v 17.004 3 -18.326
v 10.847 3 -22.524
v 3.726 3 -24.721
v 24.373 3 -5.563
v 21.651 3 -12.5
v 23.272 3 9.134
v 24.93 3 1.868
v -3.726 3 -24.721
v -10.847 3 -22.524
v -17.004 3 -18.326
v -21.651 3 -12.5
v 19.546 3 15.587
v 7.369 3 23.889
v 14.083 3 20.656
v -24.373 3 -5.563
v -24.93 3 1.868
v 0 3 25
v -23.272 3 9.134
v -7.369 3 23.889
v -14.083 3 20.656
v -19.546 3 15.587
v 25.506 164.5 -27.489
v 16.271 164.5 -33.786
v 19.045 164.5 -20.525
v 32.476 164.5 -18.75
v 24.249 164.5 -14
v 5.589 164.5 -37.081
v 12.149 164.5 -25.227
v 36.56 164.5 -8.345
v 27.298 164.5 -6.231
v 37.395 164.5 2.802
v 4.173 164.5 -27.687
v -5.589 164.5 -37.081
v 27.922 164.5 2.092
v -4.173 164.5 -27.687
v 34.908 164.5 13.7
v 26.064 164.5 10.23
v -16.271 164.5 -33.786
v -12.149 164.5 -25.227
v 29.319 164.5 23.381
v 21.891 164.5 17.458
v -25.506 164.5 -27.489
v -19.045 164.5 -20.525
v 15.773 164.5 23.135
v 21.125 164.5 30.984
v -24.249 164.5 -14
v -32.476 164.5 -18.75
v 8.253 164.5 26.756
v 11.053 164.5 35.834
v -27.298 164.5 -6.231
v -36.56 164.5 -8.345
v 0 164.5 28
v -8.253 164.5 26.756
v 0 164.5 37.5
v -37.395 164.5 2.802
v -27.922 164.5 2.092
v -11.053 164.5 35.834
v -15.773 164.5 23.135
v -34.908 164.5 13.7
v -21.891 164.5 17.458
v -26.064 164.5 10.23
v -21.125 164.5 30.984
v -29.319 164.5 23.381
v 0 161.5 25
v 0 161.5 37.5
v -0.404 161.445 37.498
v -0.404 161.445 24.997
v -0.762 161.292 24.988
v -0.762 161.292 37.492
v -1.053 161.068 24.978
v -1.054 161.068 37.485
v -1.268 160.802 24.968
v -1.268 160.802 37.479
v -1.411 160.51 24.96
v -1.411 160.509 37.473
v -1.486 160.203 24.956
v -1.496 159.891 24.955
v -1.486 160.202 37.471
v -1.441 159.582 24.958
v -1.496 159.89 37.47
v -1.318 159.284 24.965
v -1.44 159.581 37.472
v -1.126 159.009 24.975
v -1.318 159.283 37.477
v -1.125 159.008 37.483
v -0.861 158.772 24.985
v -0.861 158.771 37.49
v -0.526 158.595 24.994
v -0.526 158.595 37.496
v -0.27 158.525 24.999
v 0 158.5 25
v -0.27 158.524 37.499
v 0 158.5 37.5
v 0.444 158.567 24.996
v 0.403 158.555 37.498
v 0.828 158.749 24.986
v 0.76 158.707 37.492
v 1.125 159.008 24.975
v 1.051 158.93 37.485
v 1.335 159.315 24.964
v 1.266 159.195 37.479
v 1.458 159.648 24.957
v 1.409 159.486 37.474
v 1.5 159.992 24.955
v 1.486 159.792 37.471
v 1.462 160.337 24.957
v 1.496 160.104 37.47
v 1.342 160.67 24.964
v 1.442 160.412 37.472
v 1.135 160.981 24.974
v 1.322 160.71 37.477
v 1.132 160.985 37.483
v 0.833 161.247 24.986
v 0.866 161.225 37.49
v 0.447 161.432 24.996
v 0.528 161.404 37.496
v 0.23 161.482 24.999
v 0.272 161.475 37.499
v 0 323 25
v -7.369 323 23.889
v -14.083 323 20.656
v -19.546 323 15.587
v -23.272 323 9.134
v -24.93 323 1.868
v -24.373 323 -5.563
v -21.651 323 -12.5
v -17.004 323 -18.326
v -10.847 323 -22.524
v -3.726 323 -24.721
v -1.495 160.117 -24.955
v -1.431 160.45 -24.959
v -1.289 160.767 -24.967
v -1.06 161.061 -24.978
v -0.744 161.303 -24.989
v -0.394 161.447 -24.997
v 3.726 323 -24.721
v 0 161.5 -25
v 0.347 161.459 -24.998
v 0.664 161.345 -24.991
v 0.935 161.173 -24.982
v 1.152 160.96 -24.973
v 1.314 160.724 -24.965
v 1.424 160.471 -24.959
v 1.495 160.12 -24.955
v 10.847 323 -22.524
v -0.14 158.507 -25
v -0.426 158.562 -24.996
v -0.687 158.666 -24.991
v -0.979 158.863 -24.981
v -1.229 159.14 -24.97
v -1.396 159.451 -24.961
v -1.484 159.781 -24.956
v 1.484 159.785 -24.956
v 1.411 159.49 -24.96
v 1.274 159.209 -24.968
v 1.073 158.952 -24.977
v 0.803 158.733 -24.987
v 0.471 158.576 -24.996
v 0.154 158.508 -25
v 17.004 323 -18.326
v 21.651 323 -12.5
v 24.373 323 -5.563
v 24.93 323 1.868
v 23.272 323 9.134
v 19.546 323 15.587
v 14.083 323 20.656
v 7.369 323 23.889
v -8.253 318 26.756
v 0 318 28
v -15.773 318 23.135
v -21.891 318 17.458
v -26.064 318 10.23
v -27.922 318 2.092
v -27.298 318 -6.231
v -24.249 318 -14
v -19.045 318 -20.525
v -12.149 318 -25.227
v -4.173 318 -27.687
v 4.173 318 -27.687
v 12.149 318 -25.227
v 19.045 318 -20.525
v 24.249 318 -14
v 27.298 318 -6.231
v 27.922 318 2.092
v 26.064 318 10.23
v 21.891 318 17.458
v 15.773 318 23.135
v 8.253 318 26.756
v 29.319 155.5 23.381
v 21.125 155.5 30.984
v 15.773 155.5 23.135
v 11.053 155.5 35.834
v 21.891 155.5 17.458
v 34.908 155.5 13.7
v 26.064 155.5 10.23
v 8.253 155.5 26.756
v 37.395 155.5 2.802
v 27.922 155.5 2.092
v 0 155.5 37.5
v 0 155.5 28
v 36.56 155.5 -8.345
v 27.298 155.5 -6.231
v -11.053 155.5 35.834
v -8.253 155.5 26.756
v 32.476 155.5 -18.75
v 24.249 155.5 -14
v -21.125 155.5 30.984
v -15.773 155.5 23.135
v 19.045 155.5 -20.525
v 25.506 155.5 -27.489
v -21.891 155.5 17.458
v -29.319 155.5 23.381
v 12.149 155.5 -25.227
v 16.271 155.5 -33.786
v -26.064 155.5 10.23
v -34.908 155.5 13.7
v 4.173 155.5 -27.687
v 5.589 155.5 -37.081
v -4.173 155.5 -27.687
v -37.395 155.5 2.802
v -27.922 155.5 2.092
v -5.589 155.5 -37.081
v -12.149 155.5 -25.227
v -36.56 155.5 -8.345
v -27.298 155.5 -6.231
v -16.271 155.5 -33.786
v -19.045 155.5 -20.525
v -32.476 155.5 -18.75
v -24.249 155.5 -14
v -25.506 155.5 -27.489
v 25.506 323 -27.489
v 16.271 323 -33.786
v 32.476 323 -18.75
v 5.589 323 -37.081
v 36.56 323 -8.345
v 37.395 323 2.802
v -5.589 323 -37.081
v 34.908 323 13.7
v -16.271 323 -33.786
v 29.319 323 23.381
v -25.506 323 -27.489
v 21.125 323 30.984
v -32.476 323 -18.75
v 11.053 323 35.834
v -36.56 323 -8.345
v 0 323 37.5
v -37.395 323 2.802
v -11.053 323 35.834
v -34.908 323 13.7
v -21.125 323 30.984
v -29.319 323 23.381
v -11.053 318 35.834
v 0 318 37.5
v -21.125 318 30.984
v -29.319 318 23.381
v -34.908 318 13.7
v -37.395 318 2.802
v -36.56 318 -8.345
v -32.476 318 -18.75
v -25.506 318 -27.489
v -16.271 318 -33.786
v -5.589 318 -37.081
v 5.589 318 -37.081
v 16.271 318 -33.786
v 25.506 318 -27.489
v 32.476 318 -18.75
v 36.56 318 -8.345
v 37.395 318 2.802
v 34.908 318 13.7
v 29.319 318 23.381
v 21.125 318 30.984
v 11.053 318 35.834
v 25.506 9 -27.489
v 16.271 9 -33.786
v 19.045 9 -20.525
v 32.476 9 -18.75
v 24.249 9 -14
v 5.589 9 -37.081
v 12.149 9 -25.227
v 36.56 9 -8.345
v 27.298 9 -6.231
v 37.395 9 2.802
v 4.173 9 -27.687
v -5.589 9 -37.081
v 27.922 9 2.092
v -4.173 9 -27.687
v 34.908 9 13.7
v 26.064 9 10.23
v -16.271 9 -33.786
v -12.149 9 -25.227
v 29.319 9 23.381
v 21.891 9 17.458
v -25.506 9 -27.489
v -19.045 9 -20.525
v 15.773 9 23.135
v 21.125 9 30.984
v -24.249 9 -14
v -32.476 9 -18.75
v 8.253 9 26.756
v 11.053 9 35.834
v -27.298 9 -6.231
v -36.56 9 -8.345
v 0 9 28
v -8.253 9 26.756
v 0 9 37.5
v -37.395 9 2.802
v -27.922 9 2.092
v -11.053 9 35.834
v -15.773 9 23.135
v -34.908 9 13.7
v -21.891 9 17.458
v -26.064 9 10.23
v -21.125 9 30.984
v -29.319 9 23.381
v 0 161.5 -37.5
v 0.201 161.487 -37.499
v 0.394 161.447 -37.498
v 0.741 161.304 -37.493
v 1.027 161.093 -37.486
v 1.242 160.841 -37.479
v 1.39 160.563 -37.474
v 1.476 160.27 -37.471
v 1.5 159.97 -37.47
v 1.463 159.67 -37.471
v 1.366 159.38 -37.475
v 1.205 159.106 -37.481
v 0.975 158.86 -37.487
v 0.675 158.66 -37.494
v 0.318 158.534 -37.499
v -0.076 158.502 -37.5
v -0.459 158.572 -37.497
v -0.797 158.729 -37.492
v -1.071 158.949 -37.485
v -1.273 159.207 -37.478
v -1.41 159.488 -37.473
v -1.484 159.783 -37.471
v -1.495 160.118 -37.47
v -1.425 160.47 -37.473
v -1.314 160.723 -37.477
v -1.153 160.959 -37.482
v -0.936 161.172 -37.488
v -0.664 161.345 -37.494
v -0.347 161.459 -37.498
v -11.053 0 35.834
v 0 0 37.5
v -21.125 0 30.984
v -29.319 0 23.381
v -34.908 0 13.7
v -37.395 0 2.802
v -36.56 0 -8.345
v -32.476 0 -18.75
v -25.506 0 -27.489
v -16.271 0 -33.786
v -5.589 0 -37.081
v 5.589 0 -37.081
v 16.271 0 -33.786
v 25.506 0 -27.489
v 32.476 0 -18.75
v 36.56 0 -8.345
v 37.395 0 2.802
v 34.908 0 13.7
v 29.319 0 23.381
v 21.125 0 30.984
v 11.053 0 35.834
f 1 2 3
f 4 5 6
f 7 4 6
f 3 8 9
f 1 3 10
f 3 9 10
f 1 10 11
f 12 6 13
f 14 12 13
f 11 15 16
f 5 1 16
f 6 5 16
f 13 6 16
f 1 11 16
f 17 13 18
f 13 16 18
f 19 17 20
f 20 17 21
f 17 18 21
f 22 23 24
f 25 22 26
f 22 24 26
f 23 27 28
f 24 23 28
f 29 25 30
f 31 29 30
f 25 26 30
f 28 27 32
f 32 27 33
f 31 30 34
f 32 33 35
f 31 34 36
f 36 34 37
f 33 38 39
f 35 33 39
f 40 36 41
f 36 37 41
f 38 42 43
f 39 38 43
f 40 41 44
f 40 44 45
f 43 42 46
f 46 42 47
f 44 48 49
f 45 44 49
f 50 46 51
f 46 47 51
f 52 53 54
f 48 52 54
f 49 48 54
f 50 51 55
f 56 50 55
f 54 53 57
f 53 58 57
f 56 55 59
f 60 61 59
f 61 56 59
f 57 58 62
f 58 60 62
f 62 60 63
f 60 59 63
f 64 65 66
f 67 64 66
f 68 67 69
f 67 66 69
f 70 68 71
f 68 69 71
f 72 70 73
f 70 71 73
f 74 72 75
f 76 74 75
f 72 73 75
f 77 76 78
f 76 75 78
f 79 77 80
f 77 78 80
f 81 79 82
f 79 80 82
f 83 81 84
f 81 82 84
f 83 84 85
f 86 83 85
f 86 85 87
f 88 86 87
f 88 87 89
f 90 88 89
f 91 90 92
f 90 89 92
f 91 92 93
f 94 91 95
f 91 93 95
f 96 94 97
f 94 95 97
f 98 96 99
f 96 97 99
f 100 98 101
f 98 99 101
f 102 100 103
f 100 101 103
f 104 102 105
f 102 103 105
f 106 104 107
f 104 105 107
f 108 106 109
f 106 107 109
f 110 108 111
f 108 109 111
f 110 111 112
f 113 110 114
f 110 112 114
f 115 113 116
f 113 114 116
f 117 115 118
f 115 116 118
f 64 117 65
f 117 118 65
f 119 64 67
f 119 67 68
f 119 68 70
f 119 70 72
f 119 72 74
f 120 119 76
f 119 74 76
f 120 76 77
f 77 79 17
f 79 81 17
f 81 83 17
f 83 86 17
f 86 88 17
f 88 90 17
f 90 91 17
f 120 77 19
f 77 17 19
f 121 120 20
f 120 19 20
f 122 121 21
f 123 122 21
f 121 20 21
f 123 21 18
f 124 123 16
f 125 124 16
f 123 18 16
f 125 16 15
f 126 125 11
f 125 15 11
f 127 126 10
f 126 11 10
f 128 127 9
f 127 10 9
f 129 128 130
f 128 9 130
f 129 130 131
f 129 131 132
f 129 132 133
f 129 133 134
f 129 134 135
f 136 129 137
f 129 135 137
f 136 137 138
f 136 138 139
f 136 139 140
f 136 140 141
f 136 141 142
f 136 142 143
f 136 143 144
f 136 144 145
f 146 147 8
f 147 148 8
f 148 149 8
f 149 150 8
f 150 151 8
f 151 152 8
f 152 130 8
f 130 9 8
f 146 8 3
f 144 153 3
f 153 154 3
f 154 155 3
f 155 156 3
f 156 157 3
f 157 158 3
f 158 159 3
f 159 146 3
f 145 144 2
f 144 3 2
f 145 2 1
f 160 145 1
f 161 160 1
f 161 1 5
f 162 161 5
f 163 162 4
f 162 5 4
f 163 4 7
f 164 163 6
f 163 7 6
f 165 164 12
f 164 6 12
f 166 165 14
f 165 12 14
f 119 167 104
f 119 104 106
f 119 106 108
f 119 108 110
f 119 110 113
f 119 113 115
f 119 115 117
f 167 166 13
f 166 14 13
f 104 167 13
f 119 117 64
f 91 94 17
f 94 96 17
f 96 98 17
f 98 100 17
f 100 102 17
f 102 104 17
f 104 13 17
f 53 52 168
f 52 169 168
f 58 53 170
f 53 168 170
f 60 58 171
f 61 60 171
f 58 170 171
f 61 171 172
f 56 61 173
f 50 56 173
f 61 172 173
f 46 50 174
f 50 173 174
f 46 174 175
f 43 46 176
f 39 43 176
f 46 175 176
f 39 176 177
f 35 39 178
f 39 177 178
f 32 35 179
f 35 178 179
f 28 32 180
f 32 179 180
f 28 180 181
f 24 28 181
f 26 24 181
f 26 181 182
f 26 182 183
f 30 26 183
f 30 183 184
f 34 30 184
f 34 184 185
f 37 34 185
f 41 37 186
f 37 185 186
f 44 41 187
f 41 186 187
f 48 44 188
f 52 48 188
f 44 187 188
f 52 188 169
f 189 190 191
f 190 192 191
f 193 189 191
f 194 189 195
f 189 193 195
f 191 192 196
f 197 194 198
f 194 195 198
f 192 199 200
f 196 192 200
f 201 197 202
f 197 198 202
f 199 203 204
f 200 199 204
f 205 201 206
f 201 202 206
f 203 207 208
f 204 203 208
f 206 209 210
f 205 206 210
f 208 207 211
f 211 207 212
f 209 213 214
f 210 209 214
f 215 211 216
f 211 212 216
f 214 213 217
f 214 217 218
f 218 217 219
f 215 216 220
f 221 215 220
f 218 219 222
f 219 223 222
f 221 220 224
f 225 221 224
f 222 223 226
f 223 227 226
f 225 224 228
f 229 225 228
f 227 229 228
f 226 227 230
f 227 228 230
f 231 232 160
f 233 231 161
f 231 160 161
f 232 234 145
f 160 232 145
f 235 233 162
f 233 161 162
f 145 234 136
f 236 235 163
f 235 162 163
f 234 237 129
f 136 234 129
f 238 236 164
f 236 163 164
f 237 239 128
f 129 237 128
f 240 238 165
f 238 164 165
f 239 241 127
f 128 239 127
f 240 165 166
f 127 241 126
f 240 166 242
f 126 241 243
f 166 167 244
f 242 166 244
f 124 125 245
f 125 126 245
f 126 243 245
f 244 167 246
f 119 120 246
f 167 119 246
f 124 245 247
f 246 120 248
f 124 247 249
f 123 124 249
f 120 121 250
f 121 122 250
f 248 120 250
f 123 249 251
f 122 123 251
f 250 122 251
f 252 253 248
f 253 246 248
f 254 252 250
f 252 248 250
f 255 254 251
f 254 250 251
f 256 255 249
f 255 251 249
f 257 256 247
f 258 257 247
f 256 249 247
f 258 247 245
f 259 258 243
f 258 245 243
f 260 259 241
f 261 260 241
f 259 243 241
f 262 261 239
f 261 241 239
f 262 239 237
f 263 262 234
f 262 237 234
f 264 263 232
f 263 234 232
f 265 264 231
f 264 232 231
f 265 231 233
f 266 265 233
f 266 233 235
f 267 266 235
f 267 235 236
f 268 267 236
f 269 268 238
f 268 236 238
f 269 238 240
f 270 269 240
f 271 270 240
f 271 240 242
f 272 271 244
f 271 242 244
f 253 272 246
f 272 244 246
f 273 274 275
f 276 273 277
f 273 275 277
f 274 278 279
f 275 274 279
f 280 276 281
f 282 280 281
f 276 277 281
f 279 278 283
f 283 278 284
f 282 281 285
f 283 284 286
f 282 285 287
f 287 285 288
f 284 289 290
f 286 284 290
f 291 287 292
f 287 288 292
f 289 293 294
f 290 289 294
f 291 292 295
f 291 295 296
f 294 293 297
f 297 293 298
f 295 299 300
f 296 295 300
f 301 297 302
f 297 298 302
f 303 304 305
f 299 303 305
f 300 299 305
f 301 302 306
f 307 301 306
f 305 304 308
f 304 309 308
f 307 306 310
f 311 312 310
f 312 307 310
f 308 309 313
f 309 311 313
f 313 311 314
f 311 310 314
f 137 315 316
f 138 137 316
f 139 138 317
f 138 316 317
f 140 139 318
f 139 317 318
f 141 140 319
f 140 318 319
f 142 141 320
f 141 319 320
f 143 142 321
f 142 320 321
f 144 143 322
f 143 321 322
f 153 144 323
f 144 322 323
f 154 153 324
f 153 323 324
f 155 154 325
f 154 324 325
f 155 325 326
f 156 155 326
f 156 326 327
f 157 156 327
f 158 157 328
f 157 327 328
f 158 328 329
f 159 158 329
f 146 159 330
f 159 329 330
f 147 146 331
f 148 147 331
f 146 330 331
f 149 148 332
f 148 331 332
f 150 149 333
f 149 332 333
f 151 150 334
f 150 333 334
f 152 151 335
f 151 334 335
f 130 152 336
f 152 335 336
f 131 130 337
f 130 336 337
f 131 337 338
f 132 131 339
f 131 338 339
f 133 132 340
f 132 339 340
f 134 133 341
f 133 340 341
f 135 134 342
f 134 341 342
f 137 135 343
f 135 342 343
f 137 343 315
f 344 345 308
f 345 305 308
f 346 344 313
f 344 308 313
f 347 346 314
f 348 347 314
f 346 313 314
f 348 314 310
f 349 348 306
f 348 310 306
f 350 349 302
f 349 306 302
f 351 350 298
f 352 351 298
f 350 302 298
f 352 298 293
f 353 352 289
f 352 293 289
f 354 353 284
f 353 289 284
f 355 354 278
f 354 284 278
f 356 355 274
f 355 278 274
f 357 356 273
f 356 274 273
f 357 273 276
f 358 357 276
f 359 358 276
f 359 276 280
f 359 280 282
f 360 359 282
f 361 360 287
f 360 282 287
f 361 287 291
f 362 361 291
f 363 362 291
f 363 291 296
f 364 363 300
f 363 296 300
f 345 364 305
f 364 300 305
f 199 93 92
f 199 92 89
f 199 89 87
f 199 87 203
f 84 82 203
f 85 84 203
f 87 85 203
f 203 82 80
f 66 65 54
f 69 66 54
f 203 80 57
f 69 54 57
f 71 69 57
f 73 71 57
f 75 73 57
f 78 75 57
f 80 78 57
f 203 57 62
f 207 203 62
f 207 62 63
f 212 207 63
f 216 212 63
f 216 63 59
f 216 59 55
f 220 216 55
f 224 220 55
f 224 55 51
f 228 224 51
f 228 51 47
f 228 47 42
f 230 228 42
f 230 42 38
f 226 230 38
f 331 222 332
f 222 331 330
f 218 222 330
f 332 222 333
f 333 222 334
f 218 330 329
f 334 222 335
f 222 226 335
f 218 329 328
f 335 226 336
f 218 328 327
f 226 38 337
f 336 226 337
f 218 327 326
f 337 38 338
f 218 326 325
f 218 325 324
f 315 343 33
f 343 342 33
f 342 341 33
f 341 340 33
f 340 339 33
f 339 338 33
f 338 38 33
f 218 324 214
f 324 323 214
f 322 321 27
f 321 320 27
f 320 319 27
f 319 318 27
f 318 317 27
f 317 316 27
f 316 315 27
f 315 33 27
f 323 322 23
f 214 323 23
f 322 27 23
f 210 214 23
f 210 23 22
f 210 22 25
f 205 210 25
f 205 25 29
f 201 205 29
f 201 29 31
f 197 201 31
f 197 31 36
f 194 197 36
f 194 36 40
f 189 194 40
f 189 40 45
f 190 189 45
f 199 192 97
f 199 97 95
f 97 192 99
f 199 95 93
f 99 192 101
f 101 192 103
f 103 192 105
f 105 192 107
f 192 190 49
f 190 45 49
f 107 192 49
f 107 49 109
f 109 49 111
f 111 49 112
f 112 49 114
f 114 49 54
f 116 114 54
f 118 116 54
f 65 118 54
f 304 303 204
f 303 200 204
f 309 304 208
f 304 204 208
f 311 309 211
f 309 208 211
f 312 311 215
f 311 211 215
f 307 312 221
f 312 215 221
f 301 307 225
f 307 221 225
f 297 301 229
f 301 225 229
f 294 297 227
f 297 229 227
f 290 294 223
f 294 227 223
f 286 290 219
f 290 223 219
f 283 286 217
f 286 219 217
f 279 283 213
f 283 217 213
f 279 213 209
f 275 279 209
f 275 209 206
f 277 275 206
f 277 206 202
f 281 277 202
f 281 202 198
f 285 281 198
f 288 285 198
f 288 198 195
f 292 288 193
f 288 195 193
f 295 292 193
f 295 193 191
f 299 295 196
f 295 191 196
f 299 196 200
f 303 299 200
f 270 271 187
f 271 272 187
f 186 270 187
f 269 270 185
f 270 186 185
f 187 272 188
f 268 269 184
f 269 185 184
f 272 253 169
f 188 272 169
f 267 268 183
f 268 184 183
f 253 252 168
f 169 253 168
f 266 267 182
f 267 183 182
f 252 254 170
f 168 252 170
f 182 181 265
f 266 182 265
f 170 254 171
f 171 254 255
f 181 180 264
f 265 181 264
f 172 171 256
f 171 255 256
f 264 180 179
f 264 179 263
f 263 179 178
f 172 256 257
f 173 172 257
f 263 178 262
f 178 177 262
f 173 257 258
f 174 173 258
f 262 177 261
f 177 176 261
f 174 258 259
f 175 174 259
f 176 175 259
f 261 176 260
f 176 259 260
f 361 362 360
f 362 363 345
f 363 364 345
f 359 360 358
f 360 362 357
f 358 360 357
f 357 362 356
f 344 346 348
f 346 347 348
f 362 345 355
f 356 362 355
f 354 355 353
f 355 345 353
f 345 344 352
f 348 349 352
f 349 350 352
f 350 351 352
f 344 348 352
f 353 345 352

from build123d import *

# Parameters (mm, degrees)
CUT_EXTRUDE1_REACH      = 335.707
CUT_EXTRUDE1_END_RADIUS = 25
SKETCH2_R               = 1.5
CIRPATTERN1_COUNT       = 2


with BuildPart() as part:
    # Sketch1 → Revolve1 (revolve)
    with BuildSketch(Plane(origin=(0, 0, 0), x_dir=(0, 0, -1), z_dir=(1, 0, 0))):
        Polygon((0, 0), (-37.5, 0), (-37.5, 9), (-28, 9), (-28, 155.5), (-37.5, 155.5), (-37.5, 164.5), (-28, 164.5), (-28, 318), (-37.5, 318), (-37.5, 323), (-25, 323), (-25, 3), (0, 3), align=None)
    revolve(axis=Axis((0, 3, 0), (0, -1, 0)))

    # Cut-Extrude1: up to this cylinder (the profile starts outside it)
    cut_extrude1_end = Plane(origin=(0, 160, 0), z_dir=(0, 1, 0)) * Cylinder(CUT_EXTRUDE1_END_RADIUS, 722.414, mode=Mode.PRIVATE)
    # Sketch2 → Cut-Extrude1 (cut, up to the surface)
    with BuildSketch(Plane(origin=(0, 0, -37.5), x_dir=(-1, 0, 0), z_dir=(0, 0, -1)), mode=Mode.PRIVATE) as cut_extrude1_sk1:
        with Locations(Location((0, 160, 0), (0, 0, 90))):
            Circle(SKETCH2_R)
    cut_extrude1_tool1 = extrude(cut_extrude1_sk1.sketch, amount=-CUT_EXTRUDE1_REACH, mode=Mode.PRIVATE) - cut_extrude1_end
    cut_extrude1 = cut_extrude1_tool1.solids().sort_by_distance((0, 160, -37.5))[0]
    add(cut_extrude1, mode=Mode.SUBTRACT)

    # CirPattern1: Cut-Extrude1 ×2 about axis
    cirpattern1_axis = Axis((0, 3, 0), (0, 1, 0))
    for i in range(1, CIRPATTERN1_COUNT):
        add(cut_extrude1.rotate(cirpattern1_axis, i * 360 / CIRPATTERN1_COUNT), mode=Mode.SUBTRACT)


solid = part.part
